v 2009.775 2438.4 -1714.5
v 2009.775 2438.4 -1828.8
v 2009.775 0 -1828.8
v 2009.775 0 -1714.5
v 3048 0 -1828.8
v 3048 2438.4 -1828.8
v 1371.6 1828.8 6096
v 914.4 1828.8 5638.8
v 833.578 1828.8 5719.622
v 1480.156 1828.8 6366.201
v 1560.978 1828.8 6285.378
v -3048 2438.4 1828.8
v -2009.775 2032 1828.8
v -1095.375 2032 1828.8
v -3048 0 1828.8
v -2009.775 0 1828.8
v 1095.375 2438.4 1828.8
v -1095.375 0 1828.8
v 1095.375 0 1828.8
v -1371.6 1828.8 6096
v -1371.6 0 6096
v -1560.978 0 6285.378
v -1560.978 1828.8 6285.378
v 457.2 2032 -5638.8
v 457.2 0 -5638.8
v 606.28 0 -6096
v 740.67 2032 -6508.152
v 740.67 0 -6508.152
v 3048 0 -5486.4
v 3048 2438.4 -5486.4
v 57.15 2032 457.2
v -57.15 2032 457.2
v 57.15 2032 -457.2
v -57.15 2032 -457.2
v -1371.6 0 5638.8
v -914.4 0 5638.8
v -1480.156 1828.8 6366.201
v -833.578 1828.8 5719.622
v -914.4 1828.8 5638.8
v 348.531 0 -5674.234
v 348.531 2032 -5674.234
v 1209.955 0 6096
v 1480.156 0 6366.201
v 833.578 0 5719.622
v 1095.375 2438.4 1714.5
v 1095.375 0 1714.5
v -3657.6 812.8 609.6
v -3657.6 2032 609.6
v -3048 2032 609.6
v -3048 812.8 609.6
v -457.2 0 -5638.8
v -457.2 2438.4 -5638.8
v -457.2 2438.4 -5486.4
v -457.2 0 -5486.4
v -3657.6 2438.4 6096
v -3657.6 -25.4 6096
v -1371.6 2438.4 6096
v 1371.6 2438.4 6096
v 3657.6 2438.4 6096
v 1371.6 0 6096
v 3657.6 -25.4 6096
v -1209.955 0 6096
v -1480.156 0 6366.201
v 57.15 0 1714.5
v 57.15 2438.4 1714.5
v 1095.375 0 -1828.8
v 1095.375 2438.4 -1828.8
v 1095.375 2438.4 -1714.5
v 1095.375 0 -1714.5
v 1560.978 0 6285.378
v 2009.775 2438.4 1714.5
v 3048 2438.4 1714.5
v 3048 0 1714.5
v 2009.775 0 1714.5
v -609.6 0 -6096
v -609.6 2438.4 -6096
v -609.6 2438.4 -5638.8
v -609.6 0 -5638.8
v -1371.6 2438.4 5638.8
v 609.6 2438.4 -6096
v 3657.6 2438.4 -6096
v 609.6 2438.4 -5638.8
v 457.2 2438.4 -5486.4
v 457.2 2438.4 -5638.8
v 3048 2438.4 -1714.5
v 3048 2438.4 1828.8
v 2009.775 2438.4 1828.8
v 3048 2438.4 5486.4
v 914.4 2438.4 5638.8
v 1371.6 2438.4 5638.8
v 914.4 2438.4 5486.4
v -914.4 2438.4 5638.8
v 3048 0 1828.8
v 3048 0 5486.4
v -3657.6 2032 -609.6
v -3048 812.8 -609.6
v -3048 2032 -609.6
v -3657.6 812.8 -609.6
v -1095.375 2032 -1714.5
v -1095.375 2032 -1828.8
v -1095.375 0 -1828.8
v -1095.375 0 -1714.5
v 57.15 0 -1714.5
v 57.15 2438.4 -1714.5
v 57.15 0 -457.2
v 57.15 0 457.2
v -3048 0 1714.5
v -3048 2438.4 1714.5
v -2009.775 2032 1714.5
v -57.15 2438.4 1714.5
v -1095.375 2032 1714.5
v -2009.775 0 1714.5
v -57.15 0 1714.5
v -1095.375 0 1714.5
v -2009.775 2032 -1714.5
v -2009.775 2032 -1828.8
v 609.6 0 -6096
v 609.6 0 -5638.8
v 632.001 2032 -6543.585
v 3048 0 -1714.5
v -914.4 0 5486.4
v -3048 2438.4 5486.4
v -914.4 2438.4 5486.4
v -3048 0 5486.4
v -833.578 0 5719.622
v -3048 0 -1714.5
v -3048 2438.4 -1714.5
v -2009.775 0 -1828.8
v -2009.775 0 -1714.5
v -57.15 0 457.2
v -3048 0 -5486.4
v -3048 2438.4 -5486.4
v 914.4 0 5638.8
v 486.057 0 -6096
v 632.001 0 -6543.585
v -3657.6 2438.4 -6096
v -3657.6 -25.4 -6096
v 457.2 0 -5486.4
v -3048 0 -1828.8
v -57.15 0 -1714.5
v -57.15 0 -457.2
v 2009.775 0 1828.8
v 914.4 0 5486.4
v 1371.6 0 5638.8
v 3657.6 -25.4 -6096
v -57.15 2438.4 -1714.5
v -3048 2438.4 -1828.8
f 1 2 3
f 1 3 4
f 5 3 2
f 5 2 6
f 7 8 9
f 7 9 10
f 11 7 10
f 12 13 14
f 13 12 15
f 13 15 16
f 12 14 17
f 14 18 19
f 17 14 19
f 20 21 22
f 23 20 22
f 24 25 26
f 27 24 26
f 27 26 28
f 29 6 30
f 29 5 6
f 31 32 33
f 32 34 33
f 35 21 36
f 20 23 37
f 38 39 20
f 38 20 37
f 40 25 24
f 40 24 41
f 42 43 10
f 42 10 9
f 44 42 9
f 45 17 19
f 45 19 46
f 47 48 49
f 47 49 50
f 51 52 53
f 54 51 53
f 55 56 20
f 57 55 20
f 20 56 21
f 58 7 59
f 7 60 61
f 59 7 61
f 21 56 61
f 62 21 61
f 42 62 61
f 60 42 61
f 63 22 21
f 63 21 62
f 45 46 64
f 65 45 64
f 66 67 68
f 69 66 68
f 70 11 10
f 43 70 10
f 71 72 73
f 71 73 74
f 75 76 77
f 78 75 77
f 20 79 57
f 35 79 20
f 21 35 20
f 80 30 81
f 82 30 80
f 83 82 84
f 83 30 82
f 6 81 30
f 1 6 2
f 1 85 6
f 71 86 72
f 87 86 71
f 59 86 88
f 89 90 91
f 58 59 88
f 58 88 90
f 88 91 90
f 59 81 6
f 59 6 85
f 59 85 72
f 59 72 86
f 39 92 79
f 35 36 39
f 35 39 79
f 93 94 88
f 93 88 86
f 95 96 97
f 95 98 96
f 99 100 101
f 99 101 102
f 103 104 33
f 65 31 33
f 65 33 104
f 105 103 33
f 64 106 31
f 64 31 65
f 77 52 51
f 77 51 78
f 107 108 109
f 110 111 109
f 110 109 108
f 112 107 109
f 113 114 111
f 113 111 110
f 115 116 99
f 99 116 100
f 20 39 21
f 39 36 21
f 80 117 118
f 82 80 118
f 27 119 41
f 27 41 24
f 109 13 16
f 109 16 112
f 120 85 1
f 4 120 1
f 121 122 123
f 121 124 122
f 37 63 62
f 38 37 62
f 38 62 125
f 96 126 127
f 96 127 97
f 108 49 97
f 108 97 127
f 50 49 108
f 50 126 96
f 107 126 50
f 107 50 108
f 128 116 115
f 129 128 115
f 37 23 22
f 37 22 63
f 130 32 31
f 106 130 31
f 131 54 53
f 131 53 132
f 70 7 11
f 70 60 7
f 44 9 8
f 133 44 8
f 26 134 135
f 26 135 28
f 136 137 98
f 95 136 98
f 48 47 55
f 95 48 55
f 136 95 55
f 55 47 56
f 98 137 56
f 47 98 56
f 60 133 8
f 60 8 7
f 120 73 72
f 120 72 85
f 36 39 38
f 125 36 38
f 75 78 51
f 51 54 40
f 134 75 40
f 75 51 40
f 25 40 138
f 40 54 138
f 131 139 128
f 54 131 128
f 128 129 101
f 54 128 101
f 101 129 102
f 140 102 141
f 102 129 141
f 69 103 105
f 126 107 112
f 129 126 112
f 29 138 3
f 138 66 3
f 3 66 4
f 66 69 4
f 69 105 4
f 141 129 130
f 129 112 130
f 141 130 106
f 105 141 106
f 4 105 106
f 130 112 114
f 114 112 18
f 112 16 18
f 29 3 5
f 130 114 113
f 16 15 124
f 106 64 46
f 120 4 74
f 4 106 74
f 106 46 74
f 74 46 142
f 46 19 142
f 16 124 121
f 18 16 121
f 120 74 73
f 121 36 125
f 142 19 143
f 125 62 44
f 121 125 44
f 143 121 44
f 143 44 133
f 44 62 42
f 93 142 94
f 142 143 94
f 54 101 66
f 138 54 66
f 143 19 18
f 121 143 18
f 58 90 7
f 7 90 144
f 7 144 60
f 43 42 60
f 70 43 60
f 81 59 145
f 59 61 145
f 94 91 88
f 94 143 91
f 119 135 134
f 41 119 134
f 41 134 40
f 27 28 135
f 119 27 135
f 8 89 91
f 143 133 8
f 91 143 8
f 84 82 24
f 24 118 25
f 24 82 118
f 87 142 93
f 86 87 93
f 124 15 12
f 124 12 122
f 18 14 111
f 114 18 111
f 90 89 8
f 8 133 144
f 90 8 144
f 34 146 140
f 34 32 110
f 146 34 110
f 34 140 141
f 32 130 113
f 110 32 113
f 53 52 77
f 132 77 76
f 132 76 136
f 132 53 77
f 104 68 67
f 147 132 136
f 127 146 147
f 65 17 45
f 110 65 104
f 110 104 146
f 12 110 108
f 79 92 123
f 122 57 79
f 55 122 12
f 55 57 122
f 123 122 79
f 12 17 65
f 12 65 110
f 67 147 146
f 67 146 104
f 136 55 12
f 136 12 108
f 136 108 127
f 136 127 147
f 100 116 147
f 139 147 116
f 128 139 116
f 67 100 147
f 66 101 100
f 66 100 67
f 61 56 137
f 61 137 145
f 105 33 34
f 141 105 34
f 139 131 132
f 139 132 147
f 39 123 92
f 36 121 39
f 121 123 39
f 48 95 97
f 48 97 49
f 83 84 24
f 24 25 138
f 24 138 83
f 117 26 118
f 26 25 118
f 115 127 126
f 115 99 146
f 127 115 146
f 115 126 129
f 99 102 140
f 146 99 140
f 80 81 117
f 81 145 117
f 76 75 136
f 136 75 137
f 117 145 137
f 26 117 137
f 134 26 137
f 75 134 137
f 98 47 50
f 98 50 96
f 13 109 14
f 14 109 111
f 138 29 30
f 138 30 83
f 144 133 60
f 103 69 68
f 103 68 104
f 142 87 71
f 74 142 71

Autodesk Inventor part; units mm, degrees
ref_plane "YZ Plane" through (0, 0, 0) normal (1, 0, 0) x (0, 1, 0)
ref_plane "XZ Plane" through (0, 0, 0) normal (0, 1, 0) x (-1, 0, 0)
ref_plane "XY Plane" through (0, 0, 0) normal (0, 0, 1) x (1, 0, 0)
sketch "Sketch1" plane through (0, 0, 0) normal (0, 1, 0) x (-1, 0, 0)
  line L0 (3657.6, -6096) -> (3657.6, 6096)
  line L1 (-3657.6, 6096) -> (-3657.6, -6096)
  line L2 (-5120.64, 0) -> (5120.64, 0) projected
  line L3 (0, -23842.3169) -> (0, 22994.4703) projected
  line L4 (-3048, 1714.5) -> (-3048, -1714.5)
  line L5 (3048, -5486.4) -> (3048, -1828.8)
  line L6 (3048, -1714.5) -> (3048, 1714.5)
  line L7 (3048, 1828.8) -> (3048, 5486.4)
  line L8 (-3048, -1828.8) -> (-3048, -5486.4)
  line L9 (-3048, 5486.4) -> (-3048, 1828.8)
  line L10 (-3048, 1714.5) -> (-3048, -1714.5)
  line L11 (-2009.775, -1828.8) -> (-2009.775, -1714.5)
  line L12 (-1095.375, -1828.8) -> (-1095.375, -1714.5)
  line L13 (-3048, -1714.5) -> (-2009.775, -1714.5)
  line L14 (-1095.375, -1714.5) -> (-57.15, -1714.5)
  line L15 (-3048, -1828.8) -> (-2009.775, -1828.8)
  line L16 (2009.775, -1828.8) -> (2009.775, -1714.5)
  line L17 (1095.375, -1828.8) -> (1095.375, -1714.5)
  line L18 (3048, -1714.5) -> (2009.775, -1714.5)
  line L19 (1095.375, -1714.5) -> (57.15, -1714.5)
  line L20 (3048, -1828.8) -> (2009.775, -1828.8)
  line L21 (1095.375, -1828.8) -> (-1095.375, -1828.8)
  line L22 (-2009.775, -1828.8) -> (-3048, -1828.8)
  line L23 (-1095.375, -1828.8) -> (1095.375, -1828.8)
  line L24 (2009.775, -1828.8) -> (3048, -1828.8)
  line L25 (57.15, -1714.5) -> (1095.375, -1714.5)
  line L26 (2009.775, -1714.5) -> (3048, -1714.5)
  line L27 (-2009.775, 1828.8) -> (-2009.775, 1714.5)
  line L28 (-1095.375, 1828.8) -> (-1095.375, 1714.5)
  line L29 (-3048, 1714.5) -> (-2009.775, 1714.5)
  line L30 (-1095.375, 1714.5) -> (-57.15, 1714.5)
  line L31 (-3048, 1828.8) -> (-2009.775, 1828.8)
  line L32 (3048, 1714.5) -> (2009.775, 1714.5)
  line L33 (3048, 1828.8) -> (2009.775, 1828.8)
  line L34 (2009.775, 1828.8) -> (2009.775, 1714.5)
  line L35 (1095.375, 1828.8) -> (1095.375, 1714.5)
  line L36 (1095.375, 1714.5) -> (57.15, 1714.5)
  line L37 (1095.375, 1828.8) -> (-1095.375, 1828.8)
  line L38 (-2009.775, 1828.8) -> (-3048, 1828.8)
  line L39 (-1095.375, 1828.8) -> (1095.375, 1828.8)
  line L40 (2009.775, 1828.8) -> (3048, 1828.8)
  line L41 (57.15, 1714.5) -> (1095.375, 1714.5)
  line L42 (2009.775, 1714.5) -> (3048, 1714.5)
  line L43 (-57.15, -457.2) -> (57.15, -457.2)
  line L44 (57.15, 457.2) -> (-57.15, 457.2)
  line L45 (-609.6, -6096) -> (-609.6, -5486.4)
  line L46 (609.6, -6096) -> (609.6, -5486.4)
  line L47 (-3048, -5486.4) -> (-609.6, -5486.4)
  line L48 (609.6, -5486.4) -> (3048, -5486.4)
  line L49 (-3657.6, -6096) -> (-609.6, -6096)
  line L50 (609.6, -6096) -> (3657.6, -6096)
  line L51 (914.4, 5486.4) -> (914.4, 6096)
  line L52 (-914.4, 6096) -> (-914.4, 5486.4)
  line L53 (3048, 5486.4) -> (914.4, 5486.4)
  line L54 (-914.4, 5486.4) -> (-3048, 5486.4)
  line L55 (3657.6, 6096) -> (914.4, 6096)
  line L56 (-914.4, 6096) -> (-3657.6, 6096)
  line L57 (-57.15, -1714.5) -> (-57.15, -457.2)
  line L58 (-57.15, 457.2) -> (-57.15, 1714.5)
  line L59 (-57.15, 1714.5) -> (-57.15, 457.2)
  line L60 (-57.15, -457.2) -> (-57.15, -1714.5)
  line L61 (57.15, -1714.5) -> (57.15, -457.2)
  line L62 (57.15, 457.2) -> (57.15, 1714.5)
  line L63 (57.15, 1714.5) -> (57.15, 457.2)
  line L64 (57.15, -457.2) -> (57.15, -1714.5)
  line L65 (-3048, 5486.4) -> (-3048, 1828.8)
  line L66 (-3048, 1828.8) -> (-2009.775, 1828.8)
  line L67 (-2009.775, 1828.8) -> (-2009.775, 1714.5)
  line L68 (-2009.775, 1714.5) -> (-3048, 1714.5)
  line L69 (-3048, 1714.5) -> (-3048, -1714.5)
  line L70 (-3048, -1714.5) -> (-2009.775, -1714.5)
  line L71 (-2009.775, -1714.5) -> (-2009.775, -1828.8)
  line L72 (-2009.775, -1828.8) -> (-3048, -1828.8)
  line L73 (-3048, -1828.8) -> (-3048, -5486.4)
  line L74 (-3048, -5486.4) -> (-609.6, -5486.4)
  line L75 (609.6, -5486.4) -> (3048, -5486.4)
  line L76 (3048, -5486.4) -> (3048, -1828.8)
  line L77 (3048, -1828.8) -> (2009.775, -1828.8)
  line L78 (2009.775, -1828.8) -> (2009.775, -1714.5)
  line L79 (2009.775, -1714.5) -> (3048, -1714.5)
  line L80 (3048, 1714.5) -> (3048, -1714.5)
  line L81 (3048, 1714.5) -> (2009.775, 1714.5)
  line L82 (2009.775, 1714.5) -> (2009.775, 1828.8)
  line L83 (2009.775, 1828.8) -> (3048, 1828.8)
  line L84 (3048, 1828.8) -> (3048, 5486.4)
  point P0 (0, 0)
  point P1 (0, 23842.3169)
  point P2 (0, -22994.4703)
  dimension "d2" = 7315.2
  dimension "d10" = 609.6
  dimension "d13" = 1038.225
  dimension "d14" = 914.4
  dimension "d17" = 114.3
  dimension "d18" = 1038.225
  dimension "d19" = 1038.225
  dimension "d20" = 914.4
  dimension "d21" = 1219.2
  dimension "d23" = 609.6
  dimension "d24" = 4267.2
  dimension "d25" = 1828.8
  dimension "d26" = 12192
  dimension "d27" = 609.6
  dimension "d28" = 114.3
extrude "Extrusion1" add sketch "Sketch1" along normal blind 2438.4
sketch "Sketch2" plane through (-3657.6, 0, -6096) normal (-1, 0, 0) x (0, 0, 1)
  line L0 (0, 0) -> (12192, 0) projected
  line L1 (5486.4, 2032) -> (6705.6, 2032)
  line L2 (6705.6, 2032) -> (6705.6, 812.8)
  line L3 (6705.6, 812.8) -> (5486.4, 812.8)
  line L4 (5486.4, 812.8) -> (5486.4, 2032)
  line L5 (6096, 2926.08) -> (6096, -487.68) projected
  point P0 (6096, 0)
  dimension "d31" = 1219.2
  dimension "d33" = 1219.2
  dimension "d34" = 812.8
extrude "Extrusion2" cut sketch "Sketch2" against normal up to surface (609.6 mm away)
sketch "Sketch3" plane through (0, 2438.4, 0) normal (0, 1, 0) x (1, 0, 0)
  line L0 (57.15, 1714.5) -> (1095.375, 1714.5) projected
  line L1 (1095.375, 1714.5) -> (1095.375, 1828.8) projected
  line L2 (1095.375, 1828.8) -> (-1095.375, 1828.8) projected
  line L3 (-1095.375, 1828.8) -> (-1095.375, 1714.5) projected
  line L4 (-1095.375, 1714.5) -> (-57.15, 1714.5) projected
  line L5 (-57.15, 1714.5) -> (-57.15, 457.2) projected
  line L6 (-57.15, 457.2) -> (57.15, 457.2) projected
  line L7 (57.15, 457.2) -> (57.15, 1714.5) projected
  line L8 (-57.15, -1714.5) -> (-1095.375, -1714.5) projected
  line L9 (-1095.375, -1714.5) -> (-1095.375, -1828.8) projected
  line L10 (-1095.375, -1828.8) -> (1095.375, -1828.8) projected
  line L11 (1095.375, -1828.8) -> (1095.375, -1714.5) projected
  line L12 (1095.375, -1714.5) -> (57.15, -1714.5) projected
  line L13 (57.15, -1714.5) -> (57.15, -457.2) projected
  line L14 (57.15, -457.2) -> (-57.15, -457.2) projected
  line L15 (-57.15, -457.2) -> (-57.15, -1714.5) projected
  line L16 (3657.6, 6096) -> (609.6, 6096) projected
  line L17 (609.6, 6096) -> (609.6, 5486.4) projected
  line L18 (609.6, 5486.4) -> (3048, 5486.4) projected
  line L19 (3048, 5486.4) -> (3048, 1828.8) projected
  line L20 (3048, 1828.8) -> (2009.775, 1828.8) projected
  line L21 (2009.775, 1828.8) -> (2009.775, 1714.5) projected
  line L22 (2009.775, 1714.5) -> (3048, 1714.5) projected
  line L23 (3048, 1714.5) -> (3048, -1714.5) projected
  line L24 (3048, -1714.5) -> (2009.775, -1714.5) projected
  line L25 (2009.775, -1714.5) -> (2009.775, -1828.8) projected
  line L26 (2009.775, -1828.8) -> (3048, -1828.8) projected
  line L27 (3048, -1828.8) -> (3048, -5486.4) projected
  line L28 (3048, -5486.4) -> (914.4, -5486.4) projected
  line L29 (914.4, -5486.4) -> (914.4, -6096) projected
  line L30 (914.4, -6096) -> (3657.6, -6096) projected
  line L31 (3657.6, -6096) -> (3657.6, 6096) projected
  line L32 (-609.6, 6096) -> (609.6, 6096)
  line L33 (609.6, 6096) -> (609.6, 5486.4)
  line L34 (609.6, 5486.4) -> (-609.6, 5486.4)
  line L35 (-609.6, 5486.4) -> (-609.6, 6096)
  line L36 (-2009.775, 1828.8) -> (-1095.375, 1828.8)
  line L37 (-1095.375, 1828.8) -> (-1095.375, 1714.5)
  line L38 (-1095.375, 1714.5) -> (-2009.775, 1714.5)
  line L39 (-2009.775, 1714.5) -> (-2009.775, 1828.8)
  line L40 (1095.375, 1828.8) -> (2009.775, 1828.8)
  line L41 (2009.775, 1828.8) -> (2009.775, 1714.5)
  line L42 (2009.775, 1714.5) -> (1095.375, 1714.5)
  line L43 (1095.375, 1714.5) -> (1095.375, 1828.8)
  line L44 (-57.15, 457.2) -> (57.15, 457.2)
  line L45 (57.15, 457.2) -> (57.15, -457.2)
  line L46 (57.15, -457.2) -> (-57.15, -457.2)
  line L47 (-57.15, -457.2) -> (-57.15, 457.2)
  line L48 (1095.375, -1714.5) -> (2009.775, -1714.5)
  line L49 (2009.775, -1714.5) -> (2009.775, -1828.8)
  line L50 (2009.775, -1828.8) -> (1095.375, -1828.8)
  line L51 (1095.375, -1828.8) -> (1095.375, -1714.5)
  line L52 (-2009.775, -1714.5) -> (-1095.375, -1714.5)
  line L53 (-1095.375, -1714.5) -> (-1095.375, -1828.8)
  line L54 (-1095.375, -1828.8) -> (-2009.775, -1828.8)
  line L55 (-2009.775, -1828.8) -> (-2009.775, -1714.5)
  line L56 (-914.4, -5486.4) -> (914.4, -5486.4)
  line L57 (914.4, -5486.4) -> (914.4, -6096)
  line L58 (914.4, -6096) -> (-914.4, -6096)
  line L59 (-914.4, -6096) -> (-914.4, -5486.4)
  line L60 (1095.375, 1828.8) -> (2009.775, 1828.8)
  line L61 (2009.775, 1828.8) -> (2009.775, 1714.5)
  line L62 (2009.775, 1714.5) -> (1095.375, 1714.5)
  line L63 (1095.375, 1714.5) -> (1095.375, 1828.8)
  point P0 (0, 0)
extrude "Extrusion3" add sketch "Sketch3" against normal blind 406.4 contours L1 L40 L21 L42 | L45 L14 L47 L6 | L3 L38 L39 L36 | L48 L25 L50 L11 | L9 L54 L55 L52 | L34 L35 L32 L17 | L29 L58 L59 L56
sketch "Sketch5" plane through (0, 0, 0) normal (0, -1, 0) x (1, 0, 0)
  line L0 (3657.6, -6096) -> (609.6, -6096) projected
  line L1 (3657.6, 6096) -> (3657.6, -6096) projected
  line L2 (914.4, 6096) -> (3657.6, 6096) projected
  line L3 (914.4, 5486.4) -> (914.4, 6096) projected
  line L4 (3048, 5486.4) -> (914.4, 5486.4) projected
  line L5 (3048, 1828.8) -> (3048, 5486.4) projected
  line L6 (2009.775, 1828.8) -> (3048, 1828.8) projected
  line L7 (2009.775, 1714.5) -> (2009.775, 1828.8) projected
  line L8 (3048, 1714.5) -> (2009.775, 1714.5) projected
  line L9 (3048, -1714.5) -> (3048, 1714.5) projected
  line L10 (2009.775, -1714.5) -> (3048, -1714.5) projected
  line L11 (2009.775, -1828.8) -> (2009.775, -1714.5) projected
  line L12 (3048, -1828.8) -> (2009.775, -1828.8) projected
  line L13 (3048, -5486.4) -> (3048, -1828.8) projected
  line L14 (609.6, -5486.4) -> (3048, -5486.4) projected
  line L15 (609.6, -6096) -> (609.6, -5486.4) projected
  line L16 (-3657.6, 6096) -> (3657.6, 6096)
  line L17 (3657.6, 6096) -> (3657.6, -6096)
  line L18 (3657.6, -6096) -> (-3657.6, -6096)
  line L19 (-3657.6, -6096) -> (-3657.6, 6096)
  point P0 (0, 0)
extrude "Extrusion5" add sketch "Sketch5" along normal blind 25.4
sketch "Sketch9" plane through (0, 2438.4, 0) normal (0, 1, 0) x (1, 0, 0)
  line L0 (486.0567, 6096) -> (348.5311, 5674.2338) projected
  line L1 (348.5311, 5674.2338) -> (457.2, 5638.8) projected
  line L2 (457.2, 5638.8) -> (457.2, 5486.4) projected
  line L3 (457.2, 5486.4) -> (-457.2, 5486.4) projected
  line L4 (-457.2, 5486.4) -> (-457.2, 5638.8) projected
  line L5 (-457.2, 5638.8) -> (-609.6, 5638.8) projected
  line L6 (-609.6, 6096) -> (-609.6, 5638.8) projected
  line L7 (-609.6, 6096) -> (486.0567, 6096) projected
  line L8 (457.2, 5638.8) -> (606.2796, 6096) projected
  line L9 (606.2796, 6096) -> (609.6, 6096) projected
  line L10 (609.6, 5638.8) -> (609.6, 6096) projected
  line L11 (609.6, 5638.8) -> (457.2, 5638.8) projected
  line L12 (-609.6, 6096) -> (609.6, 6096)
  line L13 (609.6, 6096) -> (609.6, 5638.8)
  line L14 (609.6, 5638.8) -> (-609.6, 5638.8)
  line L15 (-609.6, 5638.8) -> (-609.6, 6096)
  line L16 (-457.2, 5638.8) -> (457.2, 5638.8)
  line L17 (457.2, 5638.8) -> (457.2, 5486.4)
  line L18 (457.2, 5486.4) -> (-457.2, 5486.4)
  line L19 (-457.2, 5486.4) -> (-457.2, 5638.8)
  point P0 (0, 0)
sketch "Sketch6" plane through (0, 0, 0) normal (0, 1, 0) x (1, 0, 0)
  line L0 (-3048, 5486.4) -> (-609.6, 5486.4) projected
  line L1 (-3048, 1828.8) -> (-3048, 5486.4) projected
  line L2 (57.15, 1714.5) -> (1095.375, 1714.5) projected
  line L3 (2009.775, 1714.5) -> (3048, 1714.5) projected
  line L4 (3048, 1714.5) -> (3048, -1714.5) projected
  circle A0 centre (1549.4, 0) radius 152.4
  line L5 (-1095.375, -1828.8) -> (-1095.375, -1714.5) projected
  line L6 (3048, 1828.8) -> (2009.775, 1828.8) projected
  line L7 (2009.775, 1828.8) -> (2009.775, 1714.5) projected
  line L8 (1095.375, 1828.8) -> (-1095.375, 1828.8) projected
  line L9 (1095.375, 1714.5) -> (1095.375, 1828.8) projected
  circle A1 centre (-1549.4, -3657.6) radius 152.4
  circle A2 centre (1549.4, -3657.6) radius 152.4
  line L10 (3048, -1828.8) -> (3048, -5486.4) projected
  line L11 (3048, -5486.4) -> (914.4, -5486.4) projected
  line L12 (-914.4, -5486.4) -> (-3048, -5486.4) projected
  line L13 (-3048, -5486.4) -> (-3048, -1828.8) projected
  line L14 (-1095.375, -1828.8) -> (1095.375, -1828.8) projected
  line L15 (-3048, -1828.8) -> (-2009.775, -1828.8) projected
  line L16 (609.6, 6096) -> (609.6, 5486.4) projected
  line L17 (-609.6, 5486.4) -> (-609.6, 6096) projected
  line L18 (215.9, 5702.3) -> (-215.9, 5702.3)
  line L19 (-2009.775, -1714.5) -> (-3048, -1714.5) projected
  line L20 (914.4, -5486.4) -> (914.4, -6096) projected
  line L21 (-914.4, -6096) -> (-914.4, -5486.4) projected
  circle A3 centre (457.2, -5486.4) radius 152.4
  line L22 (673.1, -5270.5) -> (241.3, -5270.5)
  line L23 (241.3, -5270.5) -> (241.3, -5702.3)
  line L24 (673.1, -5270.5) -> (241.3, -5702.3)
  line L25 (-241.3, -5270.5) -> (-673.1, -5270.5)
  circle A4 centre (-457.2, -5486.4) radius 152.4
  line L26 (-241.3, -5270.5) -> (-673.1, -5702.3)
  line L27 (-673.1, -5270.5) -> (-673.1, -5702.3)
  line L28 (2009.775, 1714.5) -> (2009.775, 1828.8) projected
  line L29 (5120.64, 0) -> (-5120.64, 0) projected
  point P0 (0, 0)
  point P1 (457.2, -5486.4)
  point P2 (-457.2, -5486.4)
  dimension "d101" = 304.8
  dimension "d106" = 1498.6
  dimension "d120" = 1498.6
  dimension "d121" = 1828.8
  dimension "d154" = 431.8
  dimension "d156" = 304.8
  dimension "d157" = 431.8
  dimension "d158" = 431.8
  dimension "d159" = 215.9
  dimension "d160" = 304.8
  dimension "d161" = 431.8
  dimension "d162" = 431.8
  dimension "d163" = 215.9
  dimension "d164" = 457.2
  dimension "d165" = 457.2
sketch "Sketch7" plane through (0, 2438.4, 0) normal (0, 1, 0) x (1, 0, 0)
  line L0 (-914.4, -6096) -> (-914.4, -5486.4) projected
  line L1 (914.4, -6096) -> (-914.4, -6096) projected
  line L2 (914.4, -5486.4) -> (914.4, -6096) projected
  line L3 (3048, -5486.4) -> (914.4, -5486.4) projected
  line L4 (3048, -1828.8) -> (3048, -5486.4) projected
  line L5 (2009.775, -1828.8) -> (3048, -1828.8) projected
  line L6 (2009.775, -1714.5) -> (2009.775, -1828.8) projected
  line L7 (3048, -1714.5) -> (2009.775, -1714.5) projected
  line L8 (3048, 1714.5) -> (3048, -1714.5) projected
  line L9 (2009.775, 1714.5) -> (3048, 1714.5) projected
  line L10 (2009.775, 1828.8) -> (2009.775, 1714.5) projected
  line L11 (3048, 1828.8) -> (2009.775, 1828.8) projected
  line L12 (3048, 5486.4) -> (3048, 1828.8) projected
  line L13 (609.6, 5486.4) -> (3048, 5486.4) projected
  line L14 (609.6, 6096) -> (609.6, 5486.4) projected
  line L15 (-609.6, 6096) -> (609.6, 6096) projected
  line L16 (-609.6, 5486.4) -> (-609.6, 6096) projected
  line L17 (-3048, 5486.4) -> (-609.6, 5486.4) projected
  line L18 (-3048, 1828.8) -> (-3048, 5486.4) projected
  line L19 (-2009.775, 1828.8) -> (-3048, 1828.8) projected
  line L20 (-2009.775, 1714.5) -> (-2009.775, 1828.8) projected
  line L21 (-3048, 1714.5) -> (-2009.775, 1714.5) projected
  line L22 (-3048, -1714.5) -> (-3048, 1714.5) projected
  line L23 (-2009.775, -1714.5) -> (-3048, -1714.5) projected
  line L24 (-2009.775, -1828.8) -> (-2009.775, -1714.5) projected
  line L25 (-3048, -1828.8) -> (-2009.775, -1828.8) projected
  line L26 (-3048, -5486.4) -> (-3048, -1828.8) projected
  line L27 (-914.4, -5486.4) -> (-3048, -5486.4) projected
  line L28 (1095.375, -1714.5) -> (57.15, -1714.5) projected
  line L29 (1095.375, -1828.8) -> (1095.375, -1714.5) projected
  line L30 (-1095.375, -1828.8) -> (1095.375, -1828.8) projected
  line L31 (-1095.375, -1714.5) -> (-1095.375, -1828.8) projected
  line L32 (-57.15, -1714.5) -> (-1095.375, -1714.5) projected
  line L33 (-57.15, -457.2) -> (-57.15, -1714.5) projected
  line L34 (57.15, -457.2) -> (-57.15, -457.2) projected
  line L35 (57.15, -1714.5) -> (57.15, -457.2) projected
  line L36 (-57.15, 457.2) -> (57.15, 457.2) projected
  line L37 (-57.15, 1714.5) -> (-57.15, 457.2) projected
  line L38 (-1095.375, 1714.5) -> (-57.15, 1714.5) projected
  line L39 (-1095.375, 1828.8) -> (-1095.375, 1714.5) projected
  line L40 (1095.375, 1828.8) -> (-1095.375, 1828.8) projected
  line L41 (1095.375, 1714.5) -> (1095.375, 1828.8) projected
  line L42 (57.15, 1714.5) -> (1095.375, 1714.5) projected
  line L43 (57.15, 457.2) -> (57.15, 1714.5) projected
  line L44 (1095.375, 1828.8) -> (2009.775, 1828.8)
  line L45 (2009.775, 1828.8) -> (2009.775, 1714.5)
  line L46 (2009.775, 1714.5) -> (1095.375, 1714.5)
  line L47 (1095.375, 1714.5) -> (1095.375, 1828.8)
  line L48 (1095.375, -1714.5) -> (2009.775, -1714.5)
  line L49 (2009.775, -1714.5) -> (2009.775, -1828.8)
  line L50 (2009.775, -1828.8) -> (1095.375, -1828.8)
  line L51 (1095.375, -1828.8) -> (1095.375, -1714.5)
  line L52 (-914.4, -5486.4) -> (914.4, -5486.4)
  line L53 (914.4, -5486.4) -> (914.4, -6096)
  line L54 (914.4, -6096) -> (-914.4, -6096)
  line L55 (-914.4, -6096) -> (-914.4, -5486.4)
  point P0 (0, 0)
extrude "Extrusion23" cut sketch "Sketch7" against normal up to surface (406.4 mm away) contours L0 L52 L2 L1 | L50 L29 L48 L6 | L46 L41 L44 L10
sketch "Sketch8" plane through (0, 0, 0) normal (0, 1, 0) x (1, 0, 0)
  line L0 (673.1, -5270.5) -> (241.3, -5702.3) projected
  line L1 (-914.4, -6096) -> (-914.4, -5486.4) projected
  line L2 (-914.4, -5486.4) -> (-3048, -5486.4) projected
  line L3 (-3657.6, -6096) -> (-3657.6, 6096) projected
  line L4 (-3657.6, 6096) -> (3657.6, 6096) projected
  line L5 (3657.6, 6096) -> (3657.6, -6096) projected
  line L6 (3657.6, -6096) -> (-3657.6, -6096) projected
  line L7 (-914.4, -5638.8) -> (-1371.6, -5638.8)
  line L8 (-1371.6, -5638.8) -> (-1371.6, -6096)
  line L9 (-1371.6, -6096) -> (-914.4, -6096)
  line L10 (-914.4, -6096) -> (-914.4, -5638.8)
  line L11 (0, 9125.5425) -> (0, -8948.1579) projected
  line L12 (-914.4, -5638.8) -> (-1560.9784, -6285.3784)
  line L13 (-1560.9784, -6285.3784) -> (-1480.1561, -6366.2007)
  line L14 (-1480.1561, -6366.2007) -> (-833.5777, -5719.6223)
  line L15 (-914.4, -5638.8) -> (-833.5777, -5719.6223)
  line L16 (914.4, -6096) -> (914.4, -5486.4)
  line L17 (-3657.6, -6096) -> (3657.6, -6096)
  line L18 (914.4, -5638.8) -> (1371.6, -5638.8)
  line L19 (1371.6, -5638.8) -> (1371.6, -6096)
  line L20 (914.4, -5638.8) -> (1560.9784, -6285.3784)
  line L21 (1560.9784, -6285.3784) -> (1480.1561, -6366.2007)
  line L22 (1480.1561, -6366.2007) -> (833.5777, -5719.6223)
  line L23 (833.5777, -5719.6223) -> (914.4, -5638.8)
  line L24 (914.4, -5638.8) -> (1371.6, -5638.8)
  line L25 (1371.6, -5638.8) -> (1371.6, -6096)
  line L26 (1371.6, -6096) -> (914.4, -6096)
  line L27 (914.4, -6096) -> (914.4, -5638.8)
  line L28 (914.4, -5638.8) -> (833.5777, -5719.6223)
  line L29 (833.5777, -5719.6223) -> (1480.1561, -6366.2007)
  line L30 (1480.1561, -6366.2007) -> (1560.9784, -6285.3784)
  line L31 (1560.9784, -6285.3784) -> (914.4, -5638.8)
  line L32 (-609.6, 5486.4) -> (-609.6, 6096) projected
  line L33 (-3048, 5486.4) -> (-609.6, 5486.4) projected
  line L34 (-609.6, 5638.8) -> (-457.2, 5638.8)
  line L35 (-457.2, 5638.8) -> (-457.2, 5486.4)
  line L36 (-457.2, 5486.4) -> (-609.6, 5486.4)
  line L37 (-609.6, 5486.4) -> (-609.6, 5638.8)
  line L38 (609.6, 5486.4) -> (609.6, 6096)
  line L39 (3048, 5486.4) -> (609.6, 5486.4)
  line L40 (609.6, 5638.8) -> (457.2, 5638.8)
  line L41 (457.2, 5638.8) -> (457.2, 5486.4)
  line L42 (457.2, 5486.4) -> (609.6, 5486.4)
  line L43 (609.6, 5486.4) -> (609.6, 5638.8)
  line L44 (457.2, 5638.8) -> (740.6702, 6508.1515)
  line L45 (740.6702, 6508.1515) -> (632.0012, 6543.5853)
  line L46 (632.0012, 6543.5853) -> (348.5311, 5674.2338)
  line L47 (457.2, 5638.8) -> (348.5311, 5674.2338)
  point P0 (564.9631, -5378.6369)
  point P1 (0, 0)
  dimension "d182" = 457.2
  dimension "d184" = 152.4
  dimension "d187" = 114.3
  dimension "d188" = 914.4
  dimension "d193" = 152.4
  dimension "d194" = 152.4
  dimension "d195" = 114.3
  dimension "d196" = 914.4
extrude "Extrusion24" cut sketch "Sketch8" along normal up to surface (2438.4 mm away) contours L6 L14 L1 | L14 L6 L12 L1 | L12 L8 L7 | L16 L22 L6 | L22 L16 L20 L6 | L20 L18 L19
extrude "Extrusion25" add sketch "Sketch8" along normal blind 1828.8 contours L14 L6 L12 L1 | L1 L15 L14 | L14 L13 L12 L6 | L22 L16 L20 L6 | L6 L20 L21 L22 | L22 L23 L16
extrude "Extrusion26" add sketch "Sketch8" along normal blind 2438.4 contours L34 L35 L36 L32 | L40 L38 L42 L41
sketch "Sketch10" plane through (0, 2438.4, 0) normal (0, 1, 0) x (1, 0, 0)
  line L0 (457.2, 5638.8) -> (457.2, 5486.4) projected
  line L1 (609.6, 5638.8) -> (609.6, 6096) projected
  line L2 (609.6, 5638.8) -> (457.2, 5638.8) projected
  line L3 (-609.6, 6096) -> (-609.6, 5638.8) projected
  line L4 (-457.2, 5638.8) -> (-609.6, 5638.8) projected
  line L5 (-457.2, 5486.4) -> (-457.2, 5638.8) projected
  line L6 (-609.6, 6096) -> (609.6, 6096)
  line L7 (609.6, 6096) -> (609.6, 5638.8)
  line L8 (609.6, 5638.8) -> (-609.6, 5638.8)
  line L9 (-609.6, 5638.8) -> (-609.6, 6096)
  point P0 (0, 0)
extrude "Extrusion29" cut sketch "Sketch10" against normal blind 2032
extrude "Extrusion30" add sketch "Sketch8" along normal blind 2032 contours L46 L45 L44 L4 | L4 L44 L47 L46
sketch "Sketch11" plane through (0, 2438.4, 0) normal (0, 1, 0) x (1, 0, 0)
  line L0 (-457.2, 5638.8) -> (457.2, 5638.8) projected
  line L1 (457.2, 5638.8) -> (457.2, 5486.4) projected
  line L2 (457.2, 5486.4) -> (-457.2, 5486.4) projected
  line L3 (-457.2, 5486.4) -> (-457.2, 5638.8) projected
  point P0 (0, 0)
extrude "Extrusion31" cut sketch "Sketch11" against normal blind 406.4
properties part number "East_Structure_Hose_Test"
